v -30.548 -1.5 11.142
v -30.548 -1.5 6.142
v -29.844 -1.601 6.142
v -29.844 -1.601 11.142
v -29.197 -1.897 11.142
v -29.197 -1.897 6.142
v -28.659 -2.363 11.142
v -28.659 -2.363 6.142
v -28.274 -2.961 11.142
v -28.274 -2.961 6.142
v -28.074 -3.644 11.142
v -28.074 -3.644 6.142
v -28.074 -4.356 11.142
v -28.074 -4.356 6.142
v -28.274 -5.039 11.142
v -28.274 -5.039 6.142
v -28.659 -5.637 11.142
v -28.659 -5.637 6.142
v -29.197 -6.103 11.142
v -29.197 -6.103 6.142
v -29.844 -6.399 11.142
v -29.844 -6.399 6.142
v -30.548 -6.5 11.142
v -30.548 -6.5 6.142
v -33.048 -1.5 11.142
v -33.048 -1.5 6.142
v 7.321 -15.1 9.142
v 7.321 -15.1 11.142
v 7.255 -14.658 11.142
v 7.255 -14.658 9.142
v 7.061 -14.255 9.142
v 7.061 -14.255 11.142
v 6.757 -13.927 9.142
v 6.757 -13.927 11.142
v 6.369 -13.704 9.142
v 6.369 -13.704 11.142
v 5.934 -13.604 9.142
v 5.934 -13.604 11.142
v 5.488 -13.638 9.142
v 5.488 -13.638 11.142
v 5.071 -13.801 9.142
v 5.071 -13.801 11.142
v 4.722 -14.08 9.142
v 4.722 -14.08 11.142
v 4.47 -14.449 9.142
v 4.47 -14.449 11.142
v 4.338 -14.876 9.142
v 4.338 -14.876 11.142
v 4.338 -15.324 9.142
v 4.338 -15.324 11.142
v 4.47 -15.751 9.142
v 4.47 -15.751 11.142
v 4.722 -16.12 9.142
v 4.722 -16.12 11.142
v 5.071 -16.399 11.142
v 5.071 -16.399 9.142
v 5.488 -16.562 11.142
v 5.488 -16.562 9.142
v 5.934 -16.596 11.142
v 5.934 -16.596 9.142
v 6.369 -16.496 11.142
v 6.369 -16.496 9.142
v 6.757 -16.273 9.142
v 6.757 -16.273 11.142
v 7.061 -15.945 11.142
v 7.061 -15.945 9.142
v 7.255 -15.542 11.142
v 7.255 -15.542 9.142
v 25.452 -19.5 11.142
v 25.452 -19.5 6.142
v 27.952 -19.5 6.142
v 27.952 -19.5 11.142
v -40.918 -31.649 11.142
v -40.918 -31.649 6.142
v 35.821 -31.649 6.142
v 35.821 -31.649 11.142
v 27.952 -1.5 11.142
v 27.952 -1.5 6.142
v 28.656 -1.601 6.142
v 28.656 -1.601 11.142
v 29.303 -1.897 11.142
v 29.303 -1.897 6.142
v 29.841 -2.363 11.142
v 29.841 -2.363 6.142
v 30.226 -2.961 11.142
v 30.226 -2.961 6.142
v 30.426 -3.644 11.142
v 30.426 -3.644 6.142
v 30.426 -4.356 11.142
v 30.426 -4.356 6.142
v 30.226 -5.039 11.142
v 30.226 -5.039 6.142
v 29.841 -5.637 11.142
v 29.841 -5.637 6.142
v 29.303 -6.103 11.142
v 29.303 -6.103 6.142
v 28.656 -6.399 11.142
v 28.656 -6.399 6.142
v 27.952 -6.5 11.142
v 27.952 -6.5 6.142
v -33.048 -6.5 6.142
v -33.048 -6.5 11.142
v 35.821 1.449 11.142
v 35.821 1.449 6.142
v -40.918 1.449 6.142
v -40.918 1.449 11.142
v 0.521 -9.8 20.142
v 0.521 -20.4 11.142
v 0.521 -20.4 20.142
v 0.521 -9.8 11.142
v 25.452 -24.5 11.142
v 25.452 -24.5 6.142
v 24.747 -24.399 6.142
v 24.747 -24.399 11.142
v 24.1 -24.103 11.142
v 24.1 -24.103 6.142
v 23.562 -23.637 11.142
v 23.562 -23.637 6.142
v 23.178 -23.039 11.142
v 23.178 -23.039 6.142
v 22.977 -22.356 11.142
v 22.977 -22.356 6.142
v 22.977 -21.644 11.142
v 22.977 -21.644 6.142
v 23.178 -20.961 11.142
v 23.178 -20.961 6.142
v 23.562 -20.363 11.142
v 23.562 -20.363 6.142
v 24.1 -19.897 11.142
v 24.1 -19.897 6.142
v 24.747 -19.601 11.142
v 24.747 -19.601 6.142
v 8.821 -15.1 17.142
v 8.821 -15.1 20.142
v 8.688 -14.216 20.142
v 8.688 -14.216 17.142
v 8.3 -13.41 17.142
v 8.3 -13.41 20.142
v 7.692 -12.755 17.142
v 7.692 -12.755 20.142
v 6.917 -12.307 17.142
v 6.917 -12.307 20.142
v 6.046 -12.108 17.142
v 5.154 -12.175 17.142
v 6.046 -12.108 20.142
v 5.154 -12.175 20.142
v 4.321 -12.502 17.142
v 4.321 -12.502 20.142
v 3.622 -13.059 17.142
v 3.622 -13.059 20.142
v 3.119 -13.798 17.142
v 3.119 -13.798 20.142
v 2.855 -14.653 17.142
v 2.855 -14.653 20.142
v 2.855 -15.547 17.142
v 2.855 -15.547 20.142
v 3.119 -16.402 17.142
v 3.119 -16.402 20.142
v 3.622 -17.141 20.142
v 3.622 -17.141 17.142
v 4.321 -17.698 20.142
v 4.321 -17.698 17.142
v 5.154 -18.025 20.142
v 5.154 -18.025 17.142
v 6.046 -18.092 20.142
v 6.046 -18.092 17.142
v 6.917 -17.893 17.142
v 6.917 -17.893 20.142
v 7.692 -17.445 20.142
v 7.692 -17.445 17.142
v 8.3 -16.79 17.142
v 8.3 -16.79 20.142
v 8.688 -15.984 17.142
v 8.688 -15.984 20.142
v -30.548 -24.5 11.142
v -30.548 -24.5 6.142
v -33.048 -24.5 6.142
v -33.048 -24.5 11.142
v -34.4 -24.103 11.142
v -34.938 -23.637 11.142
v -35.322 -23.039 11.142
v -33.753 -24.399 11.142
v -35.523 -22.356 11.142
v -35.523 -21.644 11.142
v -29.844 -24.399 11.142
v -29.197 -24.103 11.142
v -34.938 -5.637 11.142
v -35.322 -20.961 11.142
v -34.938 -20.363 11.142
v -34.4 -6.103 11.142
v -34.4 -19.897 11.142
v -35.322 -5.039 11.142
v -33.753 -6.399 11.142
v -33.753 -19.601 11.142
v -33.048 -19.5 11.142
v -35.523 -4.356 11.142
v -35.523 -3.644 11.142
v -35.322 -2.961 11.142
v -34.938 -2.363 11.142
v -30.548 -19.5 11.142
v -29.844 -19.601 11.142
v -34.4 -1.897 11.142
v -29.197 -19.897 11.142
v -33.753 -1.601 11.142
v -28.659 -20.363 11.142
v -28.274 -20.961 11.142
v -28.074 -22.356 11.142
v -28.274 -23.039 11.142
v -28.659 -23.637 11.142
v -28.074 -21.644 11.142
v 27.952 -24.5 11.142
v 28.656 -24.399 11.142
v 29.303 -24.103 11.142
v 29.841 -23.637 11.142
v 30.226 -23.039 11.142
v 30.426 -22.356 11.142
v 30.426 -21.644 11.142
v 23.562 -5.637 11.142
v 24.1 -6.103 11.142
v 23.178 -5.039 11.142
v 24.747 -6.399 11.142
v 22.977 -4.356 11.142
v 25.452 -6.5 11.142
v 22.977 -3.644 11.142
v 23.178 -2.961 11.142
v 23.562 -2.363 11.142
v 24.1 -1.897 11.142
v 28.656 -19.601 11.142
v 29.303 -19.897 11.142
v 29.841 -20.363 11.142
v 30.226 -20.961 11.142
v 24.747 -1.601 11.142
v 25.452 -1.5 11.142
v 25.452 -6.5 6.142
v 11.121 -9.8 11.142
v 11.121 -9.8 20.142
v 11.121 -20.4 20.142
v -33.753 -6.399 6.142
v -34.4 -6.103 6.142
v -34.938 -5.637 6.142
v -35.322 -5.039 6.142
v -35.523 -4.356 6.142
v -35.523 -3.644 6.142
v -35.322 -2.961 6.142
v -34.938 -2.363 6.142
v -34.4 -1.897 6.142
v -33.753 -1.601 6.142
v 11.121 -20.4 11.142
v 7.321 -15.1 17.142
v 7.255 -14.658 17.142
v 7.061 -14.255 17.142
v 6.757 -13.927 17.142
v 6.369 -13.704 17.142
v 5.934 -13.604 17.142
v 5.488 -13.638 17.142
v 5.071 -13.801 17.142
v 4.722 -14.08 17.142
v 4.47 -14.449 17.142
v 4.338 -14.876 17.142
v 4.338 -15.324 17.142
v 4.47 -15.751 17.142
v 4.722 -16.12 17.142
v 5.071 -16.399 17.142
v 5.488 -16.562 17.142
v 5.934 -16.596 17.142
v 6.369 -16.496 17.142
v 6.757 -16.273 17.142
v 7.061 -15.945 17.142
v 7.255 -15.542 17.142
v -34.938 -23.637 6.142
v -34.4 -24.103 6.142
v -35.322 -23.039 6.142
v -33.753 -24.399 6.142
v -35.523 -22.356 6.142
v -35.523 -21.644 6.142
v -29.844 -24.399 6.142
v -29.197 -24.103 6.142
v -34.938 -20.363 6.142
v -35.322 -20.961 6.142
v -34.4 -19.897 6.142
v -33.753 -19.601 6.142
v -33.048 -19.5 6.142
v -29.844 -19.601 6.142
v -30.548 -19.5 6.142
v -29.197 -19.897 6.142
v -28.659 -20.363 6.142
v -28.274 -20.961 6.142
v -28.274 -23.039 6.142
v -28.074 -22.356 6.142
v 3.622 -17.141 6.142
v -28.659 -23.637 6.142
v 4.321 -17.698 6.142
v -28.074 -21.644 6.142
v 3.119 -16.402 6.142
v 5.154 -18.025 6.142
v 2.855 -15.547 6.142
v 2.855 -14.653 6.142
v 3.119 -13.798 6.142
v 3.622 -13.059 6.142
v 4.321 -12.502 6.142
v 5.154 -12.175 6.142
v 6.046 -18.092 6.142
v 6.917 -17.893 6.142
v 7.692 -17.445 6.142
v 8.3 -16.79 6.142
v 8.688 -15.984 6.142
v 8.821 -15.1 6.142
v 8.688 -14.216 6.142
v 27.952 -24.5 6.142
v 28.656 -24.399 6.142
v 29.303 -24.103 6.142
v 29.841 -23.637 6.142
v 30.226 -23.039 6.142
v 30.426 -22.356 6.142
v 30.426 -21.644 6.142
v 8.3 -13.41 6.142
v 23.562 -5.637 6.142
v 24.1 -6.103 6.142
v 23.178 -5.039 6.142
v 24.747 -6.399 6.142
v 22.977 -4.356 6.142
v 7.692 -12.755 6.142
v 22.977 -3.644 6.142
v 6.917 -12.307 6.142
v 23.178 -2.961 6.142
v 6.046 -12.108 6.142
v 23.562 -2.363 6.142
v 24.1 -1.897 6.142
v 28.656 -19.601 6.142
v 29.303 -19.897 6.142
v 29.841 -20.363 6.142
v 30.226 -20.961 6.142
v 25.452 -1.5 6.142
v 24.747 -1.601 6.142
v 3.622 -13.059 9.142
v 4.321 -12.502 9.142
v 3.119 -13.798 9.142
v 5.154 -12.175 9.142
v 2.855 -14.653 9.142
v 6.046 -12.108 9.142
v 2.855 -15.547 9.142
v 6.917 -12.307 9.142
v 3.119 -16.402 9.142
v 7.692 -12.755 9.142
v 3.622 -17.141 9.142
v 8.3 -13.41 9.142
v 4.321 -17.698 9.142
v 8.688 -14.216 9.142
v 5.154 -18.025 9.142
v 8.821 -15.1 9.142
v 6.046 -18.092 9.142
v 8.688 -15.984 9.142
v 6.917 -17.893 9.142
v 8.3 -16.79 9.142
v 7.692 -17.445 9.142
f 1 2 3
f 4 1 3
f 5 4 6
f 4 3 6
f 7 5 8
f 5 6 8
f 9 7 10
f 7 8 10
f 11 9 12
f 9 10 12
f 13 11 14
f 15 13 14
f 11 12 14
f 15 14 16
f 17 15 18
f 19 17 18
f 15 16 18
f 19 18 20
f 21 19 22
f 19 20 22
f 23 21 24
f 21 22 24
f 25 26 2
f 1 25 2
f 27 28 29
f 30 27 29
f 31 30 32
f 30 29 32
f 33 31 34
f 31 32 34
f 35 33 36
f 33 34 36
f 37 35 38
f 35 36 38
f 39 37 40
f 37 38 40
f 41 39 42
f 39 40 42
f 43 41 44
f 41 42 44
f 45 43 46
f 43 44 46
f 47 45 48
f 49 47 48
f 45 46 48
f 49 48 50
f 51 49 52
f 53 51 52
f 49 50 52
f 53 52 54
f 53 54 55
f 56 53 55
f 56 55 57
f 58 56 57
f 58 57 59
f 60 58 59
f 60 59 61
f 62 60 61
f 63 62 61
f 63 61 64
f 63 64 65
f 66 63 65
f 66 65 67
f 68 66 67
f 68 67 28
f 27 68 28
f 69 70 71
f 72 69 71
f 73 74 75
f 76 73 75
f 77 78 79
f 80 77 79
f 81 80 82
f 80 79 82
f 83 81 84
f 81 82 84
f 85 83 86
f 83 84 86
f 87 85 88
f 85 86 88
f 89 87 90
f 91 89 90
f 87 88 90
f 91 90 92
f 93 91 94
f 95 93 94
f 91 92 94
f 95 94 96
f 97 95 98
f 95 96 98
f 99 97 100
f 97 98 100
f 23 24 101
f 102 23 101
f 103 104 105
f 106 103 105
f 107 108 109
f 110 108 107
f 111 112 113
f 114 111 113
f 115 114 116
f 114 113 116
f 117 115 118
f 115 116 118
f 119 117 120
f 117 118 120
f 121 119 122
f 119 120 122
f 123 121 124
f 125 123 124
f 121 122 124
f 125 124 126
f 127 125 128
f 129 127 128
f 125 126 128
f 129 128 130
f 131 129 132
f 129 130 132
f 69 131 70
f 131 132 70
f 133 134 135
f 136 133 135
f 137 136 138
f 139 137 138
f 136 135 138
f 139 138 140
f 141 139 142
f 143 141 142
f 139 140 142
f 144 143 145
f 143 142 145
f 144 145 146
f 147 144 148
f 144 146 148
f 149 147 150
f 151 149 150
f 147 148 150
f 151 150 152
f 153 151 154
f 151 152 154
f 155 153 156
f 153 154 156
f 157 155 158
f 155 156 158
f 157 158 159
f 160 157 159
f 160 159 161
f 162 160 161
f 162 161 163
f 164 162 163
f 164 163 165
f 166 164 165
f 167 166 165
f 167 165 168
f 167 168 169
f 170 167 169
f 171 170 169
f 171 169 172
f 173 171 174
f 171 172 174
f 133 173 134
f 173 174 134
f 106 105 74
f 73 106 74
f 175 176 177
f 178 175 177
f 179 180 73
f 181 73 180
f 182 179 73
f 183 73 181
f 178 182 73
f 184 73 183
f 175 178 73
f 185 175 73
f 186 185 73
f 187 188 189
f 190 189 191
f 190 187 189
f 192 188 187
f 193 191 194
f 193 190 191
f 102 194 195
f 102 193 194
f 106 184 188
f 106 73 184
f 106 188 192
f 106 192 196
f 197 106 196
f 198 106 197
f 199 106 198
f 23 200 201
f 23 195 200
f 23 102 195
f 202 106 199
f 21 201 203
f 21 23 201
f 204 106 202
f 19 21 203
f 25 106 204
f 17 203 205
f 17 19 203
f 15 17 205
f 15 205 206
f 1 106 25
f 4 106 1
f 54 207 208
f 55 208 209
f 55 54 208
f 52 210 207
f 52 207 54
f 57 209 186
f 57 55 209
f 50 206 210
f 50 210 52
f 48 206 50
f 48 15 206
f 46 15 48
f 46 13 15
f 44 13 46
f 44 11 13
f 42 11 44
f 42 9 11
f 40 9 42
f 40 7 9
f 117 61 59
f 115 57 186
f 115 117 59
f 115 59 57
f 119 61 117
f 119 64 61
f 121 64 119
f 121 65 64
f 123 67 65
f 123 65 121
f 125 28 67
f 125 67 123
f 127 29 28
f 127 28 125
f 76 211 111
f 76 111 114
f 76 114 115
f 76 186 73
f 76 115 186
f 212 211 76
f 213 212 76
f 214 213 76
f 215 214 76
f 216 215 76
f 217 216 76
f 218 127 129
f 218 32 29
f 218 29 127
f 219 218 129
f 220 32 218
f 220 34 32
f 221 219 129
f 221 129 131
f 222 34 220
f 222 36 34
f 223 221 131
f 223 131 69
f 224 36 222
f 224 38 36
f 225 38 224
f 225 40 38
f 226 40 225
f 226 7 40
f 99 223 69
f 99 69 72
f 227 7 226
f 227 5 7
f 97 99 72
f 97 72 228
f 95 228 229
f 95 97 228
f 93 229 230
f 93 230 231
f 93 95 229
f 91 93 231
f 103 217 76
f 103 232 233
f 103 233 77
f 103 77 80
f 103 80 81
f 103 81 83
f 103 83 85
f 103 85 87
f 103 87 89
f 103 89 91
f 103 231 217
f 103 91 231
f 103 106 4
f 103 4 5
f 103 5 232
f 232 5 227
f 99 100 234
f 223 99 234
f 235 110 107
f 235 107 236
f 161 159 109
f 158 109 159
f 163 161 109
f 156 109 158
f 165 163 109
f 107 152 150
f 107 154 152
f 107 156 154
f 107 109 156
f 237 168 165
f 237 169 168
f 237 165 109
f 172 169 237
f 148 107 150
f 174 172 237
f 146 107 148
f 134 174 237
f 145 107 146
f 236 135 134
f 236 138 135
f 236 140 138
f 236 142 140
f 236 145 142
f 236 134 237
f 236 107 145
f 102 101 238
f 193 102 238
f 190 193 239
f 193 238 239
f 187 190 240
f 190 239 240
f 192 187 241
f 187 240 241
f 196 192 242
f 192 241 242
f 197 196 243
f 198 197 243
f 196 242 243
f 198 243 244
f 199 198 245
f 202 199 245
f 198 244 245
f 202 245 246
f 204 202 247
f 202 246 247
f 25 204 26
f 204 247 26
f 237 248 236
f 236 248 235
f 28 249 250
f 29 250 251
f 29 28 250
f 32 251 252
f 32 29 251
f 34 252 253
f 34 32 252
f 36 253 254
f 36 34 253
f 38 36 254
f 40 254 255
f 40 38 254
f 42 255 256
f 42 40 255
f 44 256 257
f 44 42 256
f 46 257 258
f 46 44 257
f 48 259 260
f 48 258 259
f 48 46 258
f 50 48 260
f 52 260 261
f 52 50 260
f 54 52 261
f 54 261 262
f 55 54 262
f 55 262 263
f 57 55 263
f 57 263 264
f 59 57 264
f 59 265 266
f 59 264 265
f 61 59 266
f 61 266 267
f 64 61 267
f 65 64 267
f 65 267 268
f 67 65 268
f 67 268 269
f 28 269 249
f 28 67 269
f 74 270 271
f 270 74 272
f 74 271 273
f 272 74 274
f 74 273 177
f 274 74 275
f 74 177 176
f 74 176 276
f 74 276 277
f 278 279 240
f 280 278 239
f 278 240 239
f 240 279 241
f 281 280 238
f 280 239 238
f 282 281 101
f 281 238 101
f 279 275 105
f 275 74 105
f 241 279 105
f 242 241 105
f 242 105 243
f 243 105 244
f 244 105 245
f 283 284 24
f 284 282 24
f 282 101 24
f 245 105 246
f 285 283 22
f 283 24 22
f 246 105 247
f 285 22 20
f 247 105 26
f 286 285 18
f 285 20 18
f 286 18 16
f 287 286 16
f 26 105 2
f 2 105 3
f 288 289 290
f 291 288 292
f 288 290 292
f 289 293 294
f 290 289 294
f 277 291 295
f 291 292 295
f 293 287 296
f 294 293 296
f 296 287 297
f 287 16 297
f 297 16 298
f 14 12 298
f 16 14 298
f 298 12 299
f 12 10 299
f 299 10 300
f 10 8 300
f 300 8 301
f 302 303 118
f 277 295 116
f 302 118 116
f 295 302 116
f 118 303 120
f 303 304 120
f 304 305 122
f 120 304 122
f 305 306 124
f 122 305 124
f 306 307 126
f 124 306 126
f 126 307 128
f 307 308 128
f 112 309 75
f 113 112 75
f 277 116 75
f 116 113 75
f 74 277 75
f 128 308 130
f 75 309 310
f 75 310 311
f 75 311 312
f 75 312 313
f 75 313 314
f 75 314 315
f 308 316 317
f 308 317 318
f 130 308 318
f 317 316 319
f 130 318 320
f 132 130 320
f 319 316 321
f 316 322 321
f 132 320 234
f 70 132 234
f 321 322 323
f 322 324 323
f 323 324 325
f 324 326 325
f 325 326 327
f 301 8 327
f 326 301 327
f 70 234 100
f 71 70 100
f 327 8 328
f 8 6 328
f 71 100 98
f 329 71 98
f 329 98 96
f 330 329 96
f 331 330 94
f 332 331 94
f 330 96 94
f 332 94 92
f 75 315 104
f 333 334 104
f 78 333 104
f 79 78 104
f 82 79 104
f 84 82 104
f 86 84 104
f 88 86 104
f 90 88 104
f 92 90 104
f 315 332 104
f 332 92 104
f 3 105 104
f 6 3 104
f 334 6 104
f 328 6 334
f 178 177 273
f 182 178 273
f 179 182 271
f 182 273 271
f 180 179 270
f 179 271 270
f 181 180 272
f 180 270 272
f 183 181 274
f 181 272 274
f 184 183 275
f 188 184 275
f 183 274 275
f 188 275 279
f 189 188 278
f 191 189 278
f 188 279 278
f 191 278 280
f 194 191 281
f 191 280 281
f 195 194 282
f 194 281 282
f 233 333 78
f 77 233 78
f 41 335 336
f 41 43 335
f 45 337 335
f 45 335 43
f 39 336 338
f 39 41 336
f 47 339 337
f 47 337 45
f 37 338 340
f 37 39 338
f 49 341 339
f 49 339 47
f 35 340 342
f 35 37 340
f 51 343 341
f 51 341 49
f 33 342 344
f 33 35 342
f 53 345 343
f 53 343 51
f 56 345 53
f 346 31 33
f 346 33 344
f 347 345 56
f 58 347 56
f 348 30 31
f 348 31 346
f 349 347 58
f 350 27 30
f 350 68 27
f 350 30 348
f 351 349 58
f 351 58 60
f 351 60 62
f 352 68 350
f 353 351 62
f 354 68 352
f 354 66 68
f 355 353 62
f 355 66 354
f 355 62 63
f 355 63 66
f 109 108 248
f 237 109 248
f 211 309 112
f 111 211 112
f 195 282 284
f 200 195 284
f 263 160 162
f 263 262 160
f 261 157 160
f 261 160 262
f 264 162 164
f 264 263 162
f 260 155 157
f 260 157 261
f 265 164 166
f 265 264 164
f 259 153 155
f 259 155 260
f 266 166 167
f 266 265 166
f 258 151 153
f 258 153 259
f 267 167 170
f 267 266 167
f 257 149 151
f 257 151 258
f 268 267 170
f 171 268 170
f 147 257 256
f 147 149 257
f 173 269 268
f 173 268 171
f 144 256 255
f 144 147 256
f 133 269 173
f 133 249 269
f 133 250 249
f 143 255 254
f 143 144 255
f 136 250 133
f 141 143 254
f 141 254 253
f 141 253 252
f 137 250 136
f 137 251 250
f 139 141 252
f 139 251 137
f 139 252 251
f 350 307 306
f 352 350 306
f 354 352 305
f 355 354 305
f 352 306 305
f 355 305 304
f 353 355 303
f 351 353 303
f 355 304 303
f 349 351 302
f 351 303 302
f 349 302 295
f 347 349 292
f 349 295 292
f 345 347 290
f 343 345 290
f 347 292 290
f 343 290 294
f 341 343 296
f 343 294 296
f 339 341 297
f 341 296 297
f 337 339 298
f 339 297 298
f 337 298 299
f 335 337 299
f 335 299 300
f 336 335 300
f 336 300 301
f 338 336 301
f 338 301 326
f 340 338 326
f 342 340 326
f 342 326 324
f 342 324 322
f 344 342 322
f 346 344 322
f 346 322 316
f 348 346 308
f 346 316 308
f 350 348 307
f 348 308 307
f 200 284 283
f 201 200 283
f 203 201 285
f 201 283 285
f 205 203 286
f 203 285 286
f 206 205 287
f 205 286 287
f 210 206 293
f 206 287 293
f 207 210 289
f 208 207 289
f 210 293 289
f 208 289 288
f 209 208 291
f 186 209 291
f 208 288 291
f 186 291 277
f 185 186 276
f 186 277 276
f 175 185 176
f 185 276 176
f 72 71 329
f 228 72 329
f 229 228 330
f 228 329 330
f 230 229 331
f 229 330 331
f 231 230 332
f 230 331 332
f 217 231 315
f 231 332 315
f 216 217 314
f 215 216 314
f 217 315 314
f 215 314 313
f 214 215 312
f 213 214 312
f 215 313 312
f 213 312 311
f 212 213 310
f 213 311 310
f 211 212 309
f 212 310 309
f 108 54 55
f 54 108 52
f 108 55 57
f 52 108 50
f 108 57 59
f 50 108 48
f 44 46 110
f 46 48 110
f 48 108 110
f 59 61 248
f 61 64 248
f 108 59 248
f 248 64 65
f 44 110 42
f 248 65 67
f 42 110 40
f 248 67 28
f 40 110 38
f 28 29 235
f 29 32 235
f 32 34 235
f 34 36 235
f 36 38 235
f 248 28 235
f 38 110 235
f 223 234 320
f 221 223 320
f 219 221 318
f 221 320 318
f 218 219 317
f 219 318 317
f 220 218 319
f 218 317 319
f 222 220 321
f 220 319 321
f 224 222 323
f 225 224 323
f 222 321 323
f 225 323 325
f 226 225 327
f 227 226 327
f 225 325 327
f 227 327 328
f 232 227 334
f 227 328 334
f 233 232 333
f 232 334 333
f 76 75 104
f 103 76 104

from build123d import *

# Parameters (mm, degrees)
F0_W      = 34
F0_H      = 22
F0_R      = 4
F1_DEPTH  = 30.2
F3_DEPTH  = 5
F6_R      = 1.5
F7_DEPTH  = 25
F8_R      = 3
F9_DEPTH  = 3
F10_W     = 10.6
F10_H     = 10.6
F10_R     = 1.5
F11_DEPTH = 9
F12_R     = 3
F13_DEPTH = 3


with BuildPart() as f1:
    # F0 (on Front) → F1 (new body)
    with BuildSketch(Plane.XZ):
        with Locations((-19.0666666667, -4.8576944201)):
            Rectangle(F0_W, F0_H)
        with Locations((-19.0666666667, -4.8576944201)):
            Circle(F0_R, mode=Mode.SUBTRACT)
    extrude(amount=F1_DEPTH)


with BuildPart() as f1b:
    # F0 (on Front) → F1, piece 2 (new body)
    with BuildSketch(Plane.XZ):
        with Locations((17.7333333333, -4.8576944201)):
            Rectangle(F0_W, F0_H)
        with Locations((17.7333333333, -4.8576944201)):
            Circle(F0_R, mode=Mode.SUBTRACT)
    extrude(amount=F1_DEPTH)


with BuildPart() as f3:
    # F2 (on face) → F3 (new body)
    with BuildSketch(Plane.XY.offset(6.1423055799)):
        Polygon((-2.5481925458, 1.4494681964), (-40.9178168024, 1.4494681964), (-40.9178168024, -31.6494681964), (35.8214317108, -31.6494681964), (35.8214317108, 1.4494681964), align=None)
        with BuildLine():
            Line((-30.5481925458, -24.5), (-33.0481925458, -24.5))
            ThreePointArc((-33.0481925458, -24.5), (-35.5481925458, -22), (-33.0481925458, -19.5))
            Line((-33.0481925458, -19.5), (-30.5481925458, -19.5))
            ThreePointArc((-30.5481925458, -19.5), (-28.0481925458, -22), (-30.5481925458, -24.5))
        make_face(mode=Mode.SUBTRACT)
        with BuildLine():
            ThreePointArc((27.9518074542, -19.5), (30.4518074542, -22), (27.9518074542, -24.5))
            Line((27.9518074542, -24.5), (25.4518074542, -24.5))
            ThreePointArc((25.4518074542, -24.5), (22.9518074542, -22), (25.4518074542, -19.5))
            Line((25.4518074542, -19.5), (27.9518074542, -19.5))
        make_face(mode=Mode.SUBTRACT)
        with BuildLine():
            Line((-30.5481925458, -6.5), (-33.0481925458, -6.5))
            ThreePointArc((-33.0481925458, -6.5), (-35.5481925458, -4), (-33.0481925458, -1.5))
            Line((-33.0481925458, -1.5), (-30.5481925458, -1.5))
            ThreePointArc((-30.5481925458, -1.5), (-28.0481925458, -4), (-30.5481925458, -6.5))
        make_face(mode=Mode.SUBTRACT)
        with BuildLine():
            Line((25.4518074542, -1.5), (27.9518074542, -1.5))
            ThreePointArc((27.9518074542, -1.5), (30.4518074542, -4), (27.9518074542, -6.5))
            Line((27.9518074542, -6.5), (25.4518074542, -6.5))
            ThreePointArc((25.4518074542, -6.5), (22.9518074542, -4), (25.4518074542, -1.5))
        make_face(mode=Mode.SUBTRACT)
    extrude(amount=F3_DEPTH)

    # F6 (on face) → F7 (cut)
    with BuildSketch(Plane.XY.offset(11.1423055799)):
        with Locations((5.8214317108, -15.1)):
            Circle(F6_R)
    extrude(amount=-F7_DEPTH, mode=Mode.SUBTRACT)

    # F8 (on face) → F9 (cut)
    with BuildSketch(Plane(origin=(0, 0, 6.1423055799), x_dir=(1, 0, 0), z_dir=(0, 0, -1))):
        with Locations((5.8214317108, 15.1)):
            Circle(F8_R)
    extrude(amount=-F9_DEPTH, mode=Mode.SUBTRACT)


with BuildPart() as f11:
    # F10 (on face) → F11 (new body)
    with BuildSketch(Plane.XY.offset(11.1423055799)):
        with Locations((5.8214317108, -15.1)):
            Rectangle(F10_W, F10_H)
        with Locations((5.8214317108, -15.1)):
            Circle(F10_R, mode=Mode.SUBTRACT)
    extrude(amount=F11_DEPTH)

    # F12 (on face) → F13 (cut)
    with BuildSketch(Plane.XY.offset(20.1423055799)):
        with Locations((5.8214317108, -15.1)):
            Circle(F12_R)
    extrude(amount=-F13_DEPTH, mode=Mode.SUBTRACT)


solid = Compound([f3.part, f11.part])
